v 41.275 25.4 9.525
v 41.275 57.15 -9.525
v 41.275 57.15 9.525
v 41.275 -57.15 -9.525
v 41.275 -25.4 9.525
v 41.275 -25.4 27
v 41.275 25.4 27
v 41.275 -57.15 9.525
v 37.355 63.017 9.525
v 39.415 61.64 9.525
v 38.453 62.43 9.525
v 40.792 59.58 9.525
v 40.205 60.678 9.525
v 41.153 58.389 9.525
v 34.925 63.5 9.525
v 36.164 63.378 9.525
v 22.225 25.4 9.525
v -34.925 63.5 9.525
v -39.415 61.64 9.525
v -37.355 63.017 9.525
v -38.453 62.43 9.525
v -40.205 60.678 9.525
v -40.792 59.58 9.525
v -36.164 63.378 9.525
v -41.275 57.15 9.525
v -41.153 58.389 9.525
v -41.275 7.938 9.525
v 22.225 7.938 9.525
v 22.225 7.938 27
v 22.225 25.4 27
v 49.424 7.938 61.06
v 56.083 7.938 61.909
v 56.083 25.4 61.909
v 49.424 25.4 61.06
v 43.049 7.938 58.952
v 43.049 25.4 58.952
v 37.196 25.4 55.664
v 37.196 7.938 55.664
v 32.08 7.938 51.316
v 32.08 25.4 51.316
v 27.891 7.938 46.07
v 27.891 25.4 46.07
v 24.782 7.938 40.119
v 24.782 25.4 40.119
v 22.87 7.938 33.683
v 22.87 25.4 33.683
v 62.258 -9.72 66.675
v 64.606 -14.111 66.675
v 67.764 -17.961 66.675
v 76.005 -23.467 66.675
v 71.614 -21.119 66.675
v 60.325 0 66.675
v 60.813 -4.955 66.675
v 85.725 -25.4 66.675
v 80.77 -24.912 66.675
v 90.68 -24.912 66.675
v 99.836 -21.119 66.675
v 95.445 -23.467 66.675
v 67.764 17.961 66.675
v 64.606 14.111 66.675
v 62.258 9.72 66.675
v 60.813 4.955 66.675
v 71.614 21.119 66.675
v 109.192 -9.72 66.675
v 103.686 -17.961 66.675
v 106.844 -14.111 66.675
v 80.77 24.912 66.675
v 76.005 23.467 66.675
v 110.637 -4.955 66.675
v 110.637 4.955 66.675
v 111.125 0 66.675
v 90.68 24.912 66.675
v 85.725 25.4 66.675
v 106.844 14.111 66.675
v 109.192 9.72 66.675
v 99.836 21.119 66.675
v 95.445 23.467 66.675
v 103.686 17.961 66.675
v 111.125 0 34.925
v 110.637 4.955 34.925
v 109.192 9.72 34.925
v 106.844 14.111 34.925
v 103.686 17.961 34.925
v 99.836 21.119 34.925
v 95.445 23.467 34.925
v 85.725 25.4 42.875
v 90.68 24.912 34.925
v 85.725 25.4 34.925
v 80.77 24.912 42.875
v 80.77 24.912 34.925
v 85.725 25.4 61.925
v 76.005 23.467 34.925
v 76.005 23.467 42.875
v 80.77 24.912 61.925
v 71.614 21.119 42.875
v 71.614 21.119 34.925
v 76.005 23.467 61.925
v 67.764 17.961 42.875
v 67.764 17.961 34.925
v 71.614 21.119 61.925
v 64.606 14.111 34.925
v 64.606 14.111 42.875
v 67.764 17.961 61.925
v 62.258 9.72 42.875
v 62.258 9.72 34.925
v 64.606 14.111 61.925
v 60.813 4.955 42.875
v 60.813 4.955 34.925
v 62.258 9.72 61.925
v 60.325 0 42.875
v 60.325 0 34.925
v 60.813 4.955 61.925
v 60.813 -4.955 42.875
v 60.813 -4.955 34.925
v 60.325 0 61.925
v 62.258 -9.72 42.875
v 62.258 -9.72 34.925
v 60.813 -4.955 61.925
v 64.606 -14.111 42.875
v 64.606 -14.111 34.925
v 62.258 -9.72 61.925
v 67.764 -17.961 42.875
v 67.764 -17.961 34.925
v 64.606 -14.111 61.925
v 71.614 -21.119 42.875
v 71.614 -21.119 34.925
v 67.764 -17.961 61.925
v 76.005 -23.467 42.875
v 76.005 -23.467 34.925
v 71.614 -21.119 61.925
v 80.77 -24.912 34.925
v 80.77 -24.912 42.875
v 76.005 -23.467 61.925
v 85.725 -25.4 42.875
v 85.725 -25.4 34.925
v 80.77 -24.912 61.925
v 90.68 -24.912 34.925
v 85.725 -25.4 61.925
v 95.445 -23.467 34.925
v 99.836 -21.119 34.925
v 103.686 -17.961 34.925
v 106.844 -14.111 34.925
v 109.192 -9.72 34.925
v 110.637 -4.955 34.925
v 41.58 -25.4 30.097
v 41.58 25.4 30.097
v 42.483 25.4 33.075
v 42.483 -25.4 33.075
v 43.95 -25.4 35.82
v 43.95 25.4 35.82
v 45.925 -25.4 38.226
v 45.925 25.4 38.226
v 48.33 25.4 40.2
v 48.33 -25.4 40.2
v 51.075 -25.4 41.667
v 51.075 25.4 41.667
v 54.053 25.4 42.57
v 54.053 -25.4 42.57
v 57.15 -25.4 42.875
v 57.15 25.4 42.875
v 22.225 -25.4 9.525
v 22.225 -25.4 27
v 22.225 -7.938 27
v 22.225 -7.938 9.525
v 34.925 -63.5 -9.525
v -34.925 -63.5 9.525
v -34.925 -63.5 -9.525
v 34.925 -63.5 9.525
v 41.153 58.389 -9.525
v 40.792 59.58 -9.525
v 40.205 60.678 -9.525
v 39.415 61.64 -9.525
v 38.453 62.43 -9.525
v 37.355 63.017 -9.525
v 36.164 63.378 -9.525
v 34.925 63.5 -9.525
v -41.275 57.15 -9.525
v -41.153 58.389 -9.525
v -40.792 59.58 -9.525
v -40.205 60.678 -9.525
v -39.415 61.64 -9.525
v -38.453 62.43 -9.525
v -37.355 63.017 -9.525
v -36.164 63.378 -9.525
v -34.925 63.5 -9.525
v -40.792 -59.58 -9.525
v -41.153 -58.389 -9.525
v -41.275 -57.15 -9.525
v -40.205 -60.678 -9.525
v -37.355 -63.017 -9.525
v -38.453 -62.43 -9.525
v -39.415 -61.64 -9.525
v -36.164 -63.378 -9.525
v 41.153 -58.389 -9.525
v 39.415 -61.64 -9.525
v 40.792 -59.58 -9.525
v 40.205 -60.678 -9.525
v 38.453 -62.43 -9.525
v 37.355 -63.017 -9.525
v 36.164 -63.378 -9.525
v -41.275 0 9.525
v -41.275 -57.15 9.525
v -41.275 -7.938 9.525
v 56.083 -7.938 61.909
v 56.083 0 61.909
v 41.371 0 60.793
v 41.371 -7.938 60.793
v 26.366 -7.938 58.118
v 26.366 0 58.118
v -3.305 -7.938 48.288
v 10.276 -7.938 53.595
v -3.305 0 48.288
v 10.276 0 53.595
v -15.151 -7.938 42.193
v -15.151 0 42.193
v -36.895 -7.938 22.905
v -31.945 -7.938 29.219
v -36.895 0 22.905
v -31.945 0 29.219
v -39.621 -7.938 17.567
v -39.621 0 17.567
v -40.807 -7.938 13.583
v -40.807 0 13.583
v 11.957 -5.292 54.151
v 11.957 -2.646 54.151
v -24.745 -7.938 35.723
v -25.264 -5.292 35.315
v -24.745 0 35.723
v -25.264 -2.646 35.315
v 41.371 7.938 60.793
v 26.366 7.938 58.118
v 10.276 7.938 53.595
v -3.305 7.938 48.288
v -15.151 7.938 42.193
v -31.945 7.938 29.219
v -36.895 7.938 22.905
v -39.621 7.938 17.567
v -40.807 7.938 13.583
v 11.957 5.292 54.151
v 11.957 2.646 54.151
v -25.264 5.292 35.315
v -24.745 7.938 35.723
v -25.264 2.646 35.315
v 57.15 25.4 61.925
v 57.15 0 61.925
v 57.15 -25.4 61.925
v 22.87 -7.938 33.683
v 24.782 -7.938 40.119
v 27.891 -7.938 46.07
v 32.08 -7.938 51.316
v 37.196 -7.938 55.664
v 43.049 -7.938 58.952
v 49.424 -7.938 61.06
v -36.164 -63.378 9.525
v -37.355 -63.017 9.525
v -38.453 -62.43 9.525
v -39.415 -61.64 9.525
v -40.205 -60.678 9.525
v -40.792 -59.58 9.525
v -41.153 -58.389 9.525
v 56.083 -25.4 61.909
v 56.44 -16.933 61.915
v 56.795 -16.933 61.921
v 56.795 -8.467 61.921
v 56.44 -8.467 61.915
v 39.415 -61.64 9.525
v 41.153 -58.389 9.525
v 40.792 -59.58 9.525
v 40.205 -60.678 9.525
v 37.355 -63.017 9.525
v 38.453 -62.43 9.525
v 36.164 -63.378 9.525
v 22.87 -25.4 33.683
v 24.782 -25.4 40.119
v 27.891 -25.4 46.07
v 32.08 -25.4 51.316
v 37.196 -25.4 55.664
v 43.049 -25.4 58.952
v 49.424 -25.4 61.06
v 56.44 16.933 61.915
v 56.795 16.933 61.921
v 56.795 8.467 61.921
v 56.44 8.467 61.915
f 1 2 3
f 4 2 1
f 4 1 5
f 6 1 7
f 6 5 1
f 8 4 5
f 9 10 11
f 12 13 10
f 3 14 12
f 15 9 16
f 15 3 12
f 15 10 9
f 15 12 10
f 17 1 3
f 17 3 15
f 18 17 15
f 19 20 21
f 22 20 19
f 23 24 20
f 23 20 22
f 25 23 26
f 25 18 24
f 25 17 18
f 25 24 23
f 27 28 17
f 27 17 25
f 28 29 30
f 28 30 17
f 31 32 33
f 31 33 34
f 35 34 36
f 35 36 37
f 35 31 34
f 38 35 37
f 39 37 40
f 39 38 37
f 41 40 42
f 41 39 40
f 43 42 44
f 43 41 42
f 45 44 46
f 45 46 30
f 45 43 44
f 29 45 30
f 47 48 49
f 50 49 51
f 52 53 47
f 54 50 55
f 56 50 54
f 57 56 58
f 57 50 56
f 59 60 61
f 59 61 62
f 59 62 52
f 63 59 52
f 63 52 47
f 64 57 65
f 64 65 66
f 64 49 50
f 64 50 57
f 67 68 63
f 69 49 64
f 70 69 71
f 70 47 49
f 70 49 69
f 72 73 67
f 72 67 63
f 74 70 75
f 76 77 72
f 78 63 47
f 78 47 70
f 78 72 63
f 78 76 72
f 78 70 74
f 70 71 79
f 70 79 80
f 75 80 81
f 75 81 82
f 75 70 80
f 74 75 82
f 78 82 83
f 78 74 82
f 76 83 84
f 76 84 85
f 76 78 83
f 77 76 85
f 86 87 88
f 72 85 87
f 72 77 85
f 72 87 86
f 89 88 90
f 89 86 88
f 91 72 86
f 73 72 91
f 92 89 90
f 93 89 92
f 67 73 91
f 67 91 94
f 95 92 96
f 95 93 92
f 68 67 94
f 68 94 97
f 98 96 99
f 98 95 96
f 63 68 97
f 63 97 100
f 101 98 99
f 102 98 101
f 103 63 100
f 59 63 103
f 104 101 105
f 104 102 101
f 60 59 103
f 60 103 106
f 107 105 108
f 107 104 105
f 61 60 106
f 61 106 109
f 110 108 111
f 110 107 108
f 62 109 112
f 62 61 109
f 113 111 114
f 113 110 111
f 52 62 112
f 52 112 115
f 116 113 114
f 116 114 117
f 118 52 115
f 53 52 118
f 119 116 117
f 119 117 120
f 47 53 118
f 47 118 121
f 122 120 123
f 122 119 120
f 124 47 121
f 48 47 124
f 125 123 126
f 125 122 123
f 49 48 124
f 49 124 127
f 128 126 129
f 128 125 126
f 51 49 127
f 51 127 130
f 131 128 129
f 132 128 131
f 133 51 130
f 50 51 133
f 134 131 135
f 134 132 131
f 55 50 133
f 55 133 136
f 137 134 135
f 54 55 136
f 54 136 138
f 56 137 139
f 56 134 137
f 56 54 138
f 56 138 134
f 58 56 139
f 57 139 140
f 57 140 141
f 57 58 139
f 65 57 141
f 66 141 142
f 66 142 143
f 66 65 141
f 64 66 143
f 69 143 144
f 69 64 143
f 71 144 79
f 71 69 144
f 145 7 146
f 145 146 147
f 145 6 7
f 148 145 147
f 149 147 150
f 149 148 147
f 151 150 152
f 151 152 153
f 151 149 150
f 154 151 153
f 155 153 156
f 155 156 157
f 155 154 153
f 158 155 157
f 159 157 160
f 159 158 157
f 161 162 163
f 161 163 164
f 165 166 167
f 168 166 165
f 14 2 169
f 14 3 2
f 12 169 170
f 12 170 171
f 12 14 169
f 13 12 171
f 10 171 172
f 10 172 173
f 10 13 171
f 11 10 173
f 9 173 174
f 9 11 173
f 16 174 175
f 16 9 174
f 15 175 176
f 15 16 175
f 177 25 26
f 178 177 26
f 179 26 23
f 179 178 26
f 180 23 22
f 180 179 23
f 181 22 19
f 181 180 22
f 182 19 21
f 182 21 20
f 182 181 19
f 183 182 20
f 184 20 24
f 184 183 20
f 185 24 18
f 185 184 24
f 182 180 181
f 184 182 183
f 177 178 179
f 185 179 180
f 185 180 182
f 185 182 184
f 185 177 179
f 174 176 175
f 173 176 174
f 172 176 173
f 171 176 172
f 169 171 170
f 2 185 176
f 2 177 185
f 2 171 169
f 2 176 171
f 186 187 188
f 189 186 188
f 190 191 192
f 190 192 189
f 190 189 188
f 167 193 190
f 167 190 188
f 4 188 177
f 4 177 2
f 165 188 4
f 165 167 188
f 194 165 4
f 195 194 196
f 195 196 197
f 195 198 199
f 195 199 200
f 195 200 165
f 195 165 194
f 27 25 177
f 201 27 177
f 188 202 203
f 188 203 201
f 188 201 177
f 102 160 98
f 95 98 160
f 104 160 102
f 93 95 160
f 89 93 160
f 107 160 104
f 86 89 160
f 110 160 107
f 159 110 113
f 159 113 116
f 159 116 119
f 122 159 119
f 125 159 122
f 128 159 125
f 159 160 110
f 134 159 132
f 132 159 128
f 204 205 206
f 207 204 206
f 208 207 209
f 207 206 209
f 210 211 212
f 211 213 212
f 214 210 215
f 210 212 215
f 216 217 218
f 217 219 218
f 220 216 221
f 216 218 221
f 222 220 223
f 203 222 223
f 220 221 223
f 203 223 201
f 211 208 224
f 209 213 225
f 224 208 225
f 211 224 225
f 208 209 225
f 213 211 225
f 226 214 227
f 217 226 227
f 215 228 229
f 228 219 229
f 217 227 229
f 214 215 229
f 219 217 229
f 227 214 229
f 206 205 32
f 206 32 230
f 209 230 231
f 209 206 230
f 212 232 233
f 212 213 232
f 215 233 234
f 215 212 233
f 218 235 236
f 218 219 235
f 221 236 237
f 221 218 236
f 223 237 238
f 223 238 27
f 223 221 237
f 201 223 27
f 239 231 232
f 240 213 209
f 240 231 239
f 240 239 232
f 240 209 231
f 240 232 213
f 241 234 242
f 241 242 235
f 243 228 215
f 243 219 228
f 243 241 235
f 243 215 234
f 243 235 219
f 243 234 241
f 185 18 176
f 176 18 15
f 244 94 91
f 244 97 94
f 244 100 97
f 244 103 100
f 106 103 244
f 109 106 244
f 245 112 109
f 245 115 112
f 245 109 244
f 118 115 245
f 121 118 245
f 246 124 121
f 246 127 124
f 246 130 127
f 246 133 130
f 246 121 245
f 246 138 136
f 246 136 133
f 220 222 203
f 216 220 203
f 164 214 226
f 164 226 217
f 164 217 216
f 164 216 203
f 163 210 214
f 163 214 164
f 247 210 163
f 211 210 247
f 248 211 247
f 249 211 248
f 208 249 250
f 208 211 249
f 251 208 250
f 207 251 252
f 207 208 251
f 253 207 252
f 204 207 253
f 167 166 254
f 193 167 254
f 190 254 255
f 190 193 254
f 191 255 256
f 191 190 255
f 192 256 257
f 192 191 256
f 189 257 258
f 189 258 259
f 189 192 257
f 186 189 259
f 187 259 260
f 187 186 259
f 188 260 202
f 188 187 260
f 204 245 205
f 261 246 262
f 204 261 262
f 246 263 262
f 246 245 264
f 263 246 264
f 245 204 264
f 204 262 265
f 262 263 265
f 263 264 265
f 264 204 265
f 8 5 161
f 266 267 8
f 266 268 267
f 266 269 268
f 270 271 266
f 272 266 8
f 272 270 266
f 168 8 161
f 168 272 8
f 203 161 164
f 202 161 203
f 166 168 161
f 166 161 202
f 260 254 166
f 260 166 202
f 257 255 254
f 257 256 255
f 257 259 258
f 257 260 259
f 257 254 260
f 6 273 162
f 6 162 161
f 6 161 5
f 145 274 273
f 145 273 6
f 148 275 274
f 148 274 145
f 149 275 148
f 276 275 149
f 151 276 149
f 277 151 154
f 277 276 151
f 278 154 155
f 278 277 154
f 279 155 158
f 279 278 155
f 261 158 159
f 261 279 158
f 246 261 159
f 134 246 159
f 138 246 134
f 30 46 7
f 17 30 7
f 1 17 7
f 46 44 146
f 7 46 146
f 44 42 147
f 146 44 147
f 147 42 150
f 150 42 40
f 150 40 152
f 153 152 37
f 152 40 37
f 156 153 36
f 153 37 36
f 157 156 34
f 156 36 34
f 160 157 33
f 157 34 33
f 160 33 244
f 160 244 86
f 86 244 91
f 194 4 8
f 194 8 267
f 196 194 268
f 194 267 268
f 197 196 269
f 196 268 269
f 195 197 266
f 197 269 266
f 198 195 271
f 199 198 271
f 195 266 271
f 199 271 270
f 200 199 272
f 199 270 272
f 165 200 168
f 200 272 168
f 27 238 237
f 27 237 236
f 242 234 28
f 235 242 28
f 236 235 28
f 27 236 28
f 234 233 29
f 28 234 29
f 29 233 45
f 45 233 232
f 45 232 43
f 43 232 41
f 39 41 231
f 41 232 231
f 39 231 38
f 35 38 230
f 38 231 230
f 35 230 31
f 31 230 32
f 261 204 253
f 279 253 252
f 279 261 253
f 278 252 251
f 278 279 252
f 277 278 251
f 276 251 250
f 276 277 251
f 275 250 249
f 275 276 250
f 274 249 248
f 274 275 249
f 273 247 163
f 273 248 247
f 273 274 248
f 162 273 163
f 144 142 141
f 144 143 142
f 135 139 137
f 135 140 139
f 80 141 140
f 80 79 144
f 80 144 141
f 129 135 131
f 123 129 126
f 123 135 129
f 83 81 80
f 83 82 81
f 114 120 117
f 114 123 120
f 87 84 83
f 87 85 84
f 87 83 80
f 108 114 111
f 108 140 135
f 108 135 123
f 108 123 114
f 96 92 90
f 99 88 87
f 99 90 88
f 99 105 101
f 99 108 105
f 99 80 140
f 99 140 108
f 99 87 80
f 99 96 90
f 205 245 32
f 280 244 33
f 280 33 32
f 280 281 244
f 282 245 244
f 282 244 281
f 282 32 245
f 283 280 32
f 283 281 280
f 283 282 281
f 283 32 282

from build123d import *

# Parameters (mm, degrees)
F0_W     = 25.4
F0_H     = 19.05
F1_DEPTH = 25.4
F2_DEPTH = 63.5
F3_DEPTH = 7.9375
F5_R     = 6.35


with BuildPart() as f1:
    # F0 (on Front) → F1 (new body, symmetric)
    with BuildSketch(Plane.XZ):
        with Locations((73.025, 52.4002)):
            Rectangle(F0_W, F0_H)
        with BuildLine():
            Line((22.225, 27.0002), (22.225, 9.525))
            Line((22.225, 9.525), (41.275, 9.525))
            Line((41.275, 9.525), (41.275, 27.0002))
            ThreePointArc((41.275, 27.0002), (45.9246798487, 38.2255201513), (57.15, 42.8752))
            Line((57.15, 42.8752), (60.325, 42.8752))
            Line((60.325, 42.8752), (60.325, 61.9252))
            Line((60.325, 61.9252), (57.15, 61.9252))
            add(Edge.make_bspline(
                [(57.15, 61.9252), (56.7952901296, 61.9213576462), (56.4397740543, 61.9159247713), (56.0834888873, 61.9089120795)],
                knots=[0, 0, 0, 0, 0.9203452137, 0.9203452137, 0.9203452137, 0.9203452137], degree=3))
            ThreePointArc((56.0834888873, 61.9089120795), (32.0800625688, 51.3159122494), (22.225, 27.0002))
        make_face()
    extrude(amount=F1_DEPTH, both=True)

    # F0 (on Front) → F2 (join, symmetric)
    with BuildSketch(Plane.XZ):
        Polygon((22.225, 9.525), (-41.275, 9.525), (-41.275, -9.525), (41.275, -9.525), (41.275, 9.525), align=None)
    extrude(amount=F2_DEPTH, both=True)

    # F0 (on Front) → F3 (join, symmetric)
    with BuildSketch(Plane.XZ):
        with BuildLine():
            add(Edge.make_bspline(
                [(56.0834888873, 61.9089120795), (13.2740013728, 61.0663012405), (-40.6390568029, 37.4154732137), (-41.275, 9.525)],
                knots=[0.9203452137, 0.9203452137, 0.9203452137, 0.9203452137, 111.5045361635, 111.5045361635, 111.5045361635, 111.5045361635], degree=3))
            Line((-41.275, 9.525), (22.225, 9.525))
            Line((22.225, 9.525), (22.225, 27.0002))
            ThreePointArc((22.225, 27.0002), (32.0800625688, 51.3159122494), (56.0834888873, 61.9089120795))
        make_face()
    extrude(amount=F3_DEPTH, both=True)

    # F0 (on Front) → F4 (revolve)
    with BuildSketch(Plane.XZ):
        Polygon((85.725, 66.675), (85.725, 61.9252), (85.725, 42.8752), (85.725, 34.925), (111.125, 34.925), (111.125, 66.675), align=None)
    revolve(axis=Axis((85.725, 0, 50.8), (0, 0, 1)))

    # F5
    f5_edges = [f1.edges().sort_by_distance(p)[0] for p in [
        (41.275, -63.5, 0),
        (-41.275, -63.5, 0),
        (41.275, 63.5, 0),
        (-41.275, 63.5, 0),
    ]]
    fillet(f5_edges, radius=F5_R)


solid = f1.part
